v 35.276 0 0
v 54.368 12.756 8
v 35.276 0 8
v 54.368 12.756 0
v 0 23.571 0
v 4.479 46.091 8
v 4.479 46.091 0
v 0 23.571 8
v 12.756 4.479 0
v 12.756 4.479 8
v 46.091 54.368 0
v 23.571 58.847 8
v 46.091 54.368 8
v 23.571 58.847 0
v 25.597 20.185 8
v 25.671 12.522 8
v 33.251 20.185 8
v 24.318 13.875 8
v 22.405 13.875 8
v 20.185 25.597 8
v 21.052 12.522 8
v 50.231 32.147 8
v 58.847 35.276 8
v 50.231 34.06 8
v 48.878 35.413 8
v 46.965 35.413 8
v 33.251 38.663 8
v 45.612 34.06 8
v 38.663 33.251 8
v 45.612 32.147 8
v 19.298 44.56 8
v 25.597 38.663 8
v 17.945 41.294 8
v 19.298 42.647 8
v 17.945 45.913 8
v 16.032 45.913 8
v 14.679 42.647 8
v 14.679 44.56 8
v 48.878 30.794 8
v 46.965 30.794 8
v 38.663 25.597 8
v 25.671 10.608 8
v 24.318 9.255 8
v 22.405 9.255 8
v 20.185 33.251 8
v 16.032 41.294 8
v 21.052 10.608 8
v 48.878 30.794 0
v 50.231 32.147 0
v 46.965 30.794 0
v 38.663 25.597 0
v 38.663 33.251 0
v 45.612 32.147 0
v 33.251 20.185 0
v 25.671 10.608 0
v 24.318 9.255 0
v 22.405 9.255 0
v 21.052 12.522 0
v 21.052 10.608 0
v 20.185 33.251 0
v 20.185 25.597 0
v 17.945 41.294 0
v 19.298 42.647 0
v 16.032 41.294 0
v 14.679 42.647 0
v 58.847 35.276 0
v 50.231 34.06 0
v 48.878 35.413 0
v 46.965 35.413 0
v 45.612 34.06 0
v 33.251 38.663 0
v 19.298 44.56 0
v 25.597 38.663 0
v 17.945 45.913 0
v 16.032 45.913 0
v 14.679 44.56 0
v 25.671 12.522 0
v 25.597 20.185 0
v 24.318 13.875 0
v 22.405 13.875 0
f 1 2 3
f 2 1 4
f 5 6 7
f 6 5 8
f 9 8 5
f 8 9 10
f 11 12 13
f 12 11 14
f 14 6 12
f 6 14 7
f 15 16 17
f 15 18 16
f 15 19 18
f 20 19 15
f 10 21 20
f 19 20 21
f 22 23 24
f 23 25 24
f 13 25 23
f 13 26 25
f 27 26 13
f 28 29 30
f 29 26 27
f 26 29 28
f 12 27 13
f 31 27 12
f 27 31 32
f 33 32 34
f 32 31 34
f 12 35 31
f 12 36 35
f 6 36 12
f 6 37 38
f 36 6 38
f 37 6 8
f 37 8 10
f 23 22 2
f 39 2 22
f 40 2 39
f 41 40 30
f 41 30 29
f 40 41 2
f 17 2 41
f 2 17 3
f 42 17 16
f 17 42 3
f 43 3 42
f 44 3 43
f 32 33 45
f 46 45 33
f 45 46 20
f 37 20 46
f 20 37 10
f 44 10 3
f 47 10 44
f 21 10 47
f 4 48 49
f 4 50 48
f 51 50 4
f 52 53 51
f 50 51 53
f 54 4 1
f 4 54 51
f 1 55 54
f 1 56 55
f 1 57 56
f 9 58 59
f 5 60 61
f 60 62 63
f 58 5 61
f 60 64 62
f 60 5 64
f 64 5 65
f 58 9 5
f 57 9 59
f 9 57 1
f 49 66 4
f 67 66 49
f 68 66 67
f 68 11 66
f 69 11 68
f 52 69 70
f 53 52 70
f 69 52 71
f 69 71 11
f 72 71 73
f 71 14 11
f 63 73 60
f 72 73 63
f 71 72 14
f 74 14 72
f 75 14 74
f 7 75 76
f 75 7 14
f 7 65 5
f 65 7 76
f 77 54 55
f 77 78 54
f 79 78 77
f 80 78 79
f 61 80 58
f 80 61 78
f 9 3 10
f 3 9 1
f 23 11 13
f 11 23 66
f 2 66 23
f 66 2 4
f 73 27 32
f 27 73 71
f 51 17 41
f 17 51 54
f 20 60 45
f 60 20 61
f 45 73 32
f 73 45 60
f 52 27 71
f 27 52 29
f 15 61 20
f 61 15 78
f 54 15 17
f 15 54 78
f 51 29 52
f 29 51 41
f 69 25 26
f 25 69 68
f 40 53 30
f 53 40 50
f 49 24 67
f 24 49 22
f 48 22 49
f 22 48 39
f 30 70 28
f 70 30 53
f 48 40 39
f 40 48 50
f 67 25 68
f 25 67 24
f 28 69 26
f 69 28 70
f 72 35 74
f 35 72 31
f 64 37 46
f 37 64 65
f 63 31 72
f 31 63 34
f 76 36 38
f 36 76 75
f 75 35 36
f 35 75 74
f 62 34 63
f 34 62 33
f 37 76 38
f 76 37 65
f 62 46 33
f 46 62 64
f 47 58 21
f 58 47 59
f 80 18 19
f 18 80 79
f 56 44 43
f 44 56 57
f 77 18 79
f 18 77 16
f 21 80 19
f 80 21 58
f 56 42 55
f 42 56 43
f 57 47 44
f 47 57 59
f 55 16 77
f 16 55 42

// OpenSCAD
$fn = 32;

// ----------------------------------------------------------------------
// Polygon plate: 8-gon R30, 3 bolt windows
// ----------------------------------------------------------------------

// --- parameters (mm) ---
sides = 8;                // number of polygon sides
plate_r = 30;             // circumscribed radius of the polygon
bore_r = 10;              // centre bore radius
bolts = 3;                // number of bolt windows
ring_r = 18.86;           // bolt-circle radius
bolt_r = 2.5;             // bolt window radius
plate_t = 8;              // plate thickness, Z (extrusion height)

plate_d = 2 * plate_r;  // circumscribed diameter
bore_d = 2 * bore_r;  // centre bore diameter
bolt_d = 2 * bolt_r;  // bolt window diameter
ring_d = 2 * ring_r;  // bolt-circle diameter

profile = [[58.847, 35.276], [46.091, 54.368], [23.571, 58.847], [4.479, 46.091], [0, 23.571], [12.756, 4.479], [35.276, 0], [54.368, 12.756]];  // primary outline, 8 points, counter clockwise
void_1 = [[38.663, 33.251], [33.251, 38.663], [25.597, 38.663], [20.185, 33.251], [20.185, 25.597], [25.597, 20.185], [33.251, 20.185], [38.663, 25.597]];  // centre bore, 8 points
void_2 = [[50.231, 34.06], [48.878, 35.413], [46.965, 35.413], [45.612, 34.06], [45.612, 32.147], [46.965, 30.794], [48.878, 30.794], [50.231, 32.147]];  // bolt window 1, 8 points
void_3 = [[19.298, 44.56], [17.945, 45.913], [16.032, 45.913], [14.679, 44.56], [14.679, 42.647], [16.032, 41.294], [17.945, 41.294], [19.298, 42.647]];  // bolt window 2, 8 points
void_4 = [[25.671, 12.522], [24.318, 13.875], [22.405, 13.875], [21.052, 12.522], [21.052, 10.608], [22.405, 9.255], [24.318, 9.255], [25.671, 10.608]];  // bolt window 3, 8 points

// --- the one profile operation ---
difference() {
  linear_extrude(height = plate_t) polygon(points = profile);
  translate([0, 0, -1])
    linear_extrude(height = plate_t + 2) polygon(points = void_1);
  translate([0, 0, -1])
    linear_extrude(height = plate_t + 2) polygon(points = void_2);
  translate([0, 0, -1])
    linear_extrude(height = plate_t + 2) polygon(points = void_3);
  translate([0, 0, -1])
    linear_extrude(height = plate_t + 2) polygon(points = void_4);
}
